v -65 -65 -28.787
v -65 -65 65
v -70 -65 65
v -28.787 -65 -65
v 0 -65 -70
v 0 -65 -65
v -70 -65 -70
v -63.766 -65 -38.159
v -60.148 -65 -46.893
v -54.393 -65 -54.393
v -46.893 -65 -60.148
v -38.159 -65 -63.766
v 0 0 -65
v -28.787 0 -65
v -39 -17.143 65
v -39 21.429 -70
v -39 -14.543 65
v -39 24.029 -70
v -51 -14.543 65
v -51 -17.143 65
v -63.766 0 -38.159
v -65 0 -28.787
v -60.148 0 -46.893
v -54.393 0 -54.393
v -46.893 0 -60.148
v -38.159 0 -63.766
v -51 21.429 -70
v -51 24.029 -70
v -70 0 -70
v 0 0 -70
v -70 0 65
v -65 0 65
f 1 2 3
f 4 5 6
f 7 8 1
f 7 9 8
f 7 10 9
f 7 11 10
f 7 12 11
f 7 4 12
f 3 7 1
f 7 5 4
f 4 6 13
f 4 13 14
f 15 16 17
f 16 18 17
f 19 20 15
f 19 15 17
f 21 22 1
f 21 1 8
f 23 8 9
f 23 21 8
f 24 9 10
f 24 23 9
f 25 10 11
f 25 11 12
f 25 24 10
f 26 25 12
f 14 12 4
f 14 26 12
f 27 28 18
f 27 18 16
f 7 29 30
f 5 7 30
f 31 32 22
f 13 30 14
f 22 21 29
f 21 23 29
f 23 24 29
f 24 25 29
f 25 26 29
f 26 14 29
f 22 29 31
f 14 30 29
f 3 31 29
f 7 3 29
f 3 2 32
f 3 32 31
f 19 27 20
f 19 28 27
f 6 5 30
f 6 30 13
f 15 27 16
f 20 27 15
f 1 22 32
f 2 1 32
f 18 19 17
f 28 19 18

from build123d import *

# Parameters (mm, degrees)
BOSS_EXTRUDE1_DEPTH = 65
BOSS_EXTRUDE3_START = -19
BOSS_EXTRUDE3_DEPTH = 12


with BuildPart() as part:
    # Sketch1 → Boss-Extrude1 (new body)
    with BuildSketch(Plane(origin=(0, 0, 0), x_dir=(1, 0, 0), z_dir=(0, 1, 0))):
        Polygon((0, 70), (0, 65), (-65, 65), (-65, -65), (-70, -65), (-70, 70), align=None)
        with BuildLine():
            ThreePointArc((-65, 28.786796564), (-54.393398282, 54.393398282), (-28.786796564, 65))
            Line((-28.786796564, 65), (-65, 65))
            Line((-65, 65), (-65, 28.786796564))
        make_face()
    extrude(amount=-BOSS_EXTRUDE1_DEPTH)


with BuildPart() as body_2:
    # Sketch3 → Boss-Extrude3 (new body)
    with BuildSketch(Plane.ZY.offset(70).offset(BOSS_EXTRUDE3_START)):
        Polygon((-70, 21.428571429), (65, -17.142857143), (65, -14.542817897), (-70, 24.028610675), align=None)
    extrude(amount=-BOSS_EXTRUDE3_DEPTH)


solid = Compound([part.part, body_2.part])
